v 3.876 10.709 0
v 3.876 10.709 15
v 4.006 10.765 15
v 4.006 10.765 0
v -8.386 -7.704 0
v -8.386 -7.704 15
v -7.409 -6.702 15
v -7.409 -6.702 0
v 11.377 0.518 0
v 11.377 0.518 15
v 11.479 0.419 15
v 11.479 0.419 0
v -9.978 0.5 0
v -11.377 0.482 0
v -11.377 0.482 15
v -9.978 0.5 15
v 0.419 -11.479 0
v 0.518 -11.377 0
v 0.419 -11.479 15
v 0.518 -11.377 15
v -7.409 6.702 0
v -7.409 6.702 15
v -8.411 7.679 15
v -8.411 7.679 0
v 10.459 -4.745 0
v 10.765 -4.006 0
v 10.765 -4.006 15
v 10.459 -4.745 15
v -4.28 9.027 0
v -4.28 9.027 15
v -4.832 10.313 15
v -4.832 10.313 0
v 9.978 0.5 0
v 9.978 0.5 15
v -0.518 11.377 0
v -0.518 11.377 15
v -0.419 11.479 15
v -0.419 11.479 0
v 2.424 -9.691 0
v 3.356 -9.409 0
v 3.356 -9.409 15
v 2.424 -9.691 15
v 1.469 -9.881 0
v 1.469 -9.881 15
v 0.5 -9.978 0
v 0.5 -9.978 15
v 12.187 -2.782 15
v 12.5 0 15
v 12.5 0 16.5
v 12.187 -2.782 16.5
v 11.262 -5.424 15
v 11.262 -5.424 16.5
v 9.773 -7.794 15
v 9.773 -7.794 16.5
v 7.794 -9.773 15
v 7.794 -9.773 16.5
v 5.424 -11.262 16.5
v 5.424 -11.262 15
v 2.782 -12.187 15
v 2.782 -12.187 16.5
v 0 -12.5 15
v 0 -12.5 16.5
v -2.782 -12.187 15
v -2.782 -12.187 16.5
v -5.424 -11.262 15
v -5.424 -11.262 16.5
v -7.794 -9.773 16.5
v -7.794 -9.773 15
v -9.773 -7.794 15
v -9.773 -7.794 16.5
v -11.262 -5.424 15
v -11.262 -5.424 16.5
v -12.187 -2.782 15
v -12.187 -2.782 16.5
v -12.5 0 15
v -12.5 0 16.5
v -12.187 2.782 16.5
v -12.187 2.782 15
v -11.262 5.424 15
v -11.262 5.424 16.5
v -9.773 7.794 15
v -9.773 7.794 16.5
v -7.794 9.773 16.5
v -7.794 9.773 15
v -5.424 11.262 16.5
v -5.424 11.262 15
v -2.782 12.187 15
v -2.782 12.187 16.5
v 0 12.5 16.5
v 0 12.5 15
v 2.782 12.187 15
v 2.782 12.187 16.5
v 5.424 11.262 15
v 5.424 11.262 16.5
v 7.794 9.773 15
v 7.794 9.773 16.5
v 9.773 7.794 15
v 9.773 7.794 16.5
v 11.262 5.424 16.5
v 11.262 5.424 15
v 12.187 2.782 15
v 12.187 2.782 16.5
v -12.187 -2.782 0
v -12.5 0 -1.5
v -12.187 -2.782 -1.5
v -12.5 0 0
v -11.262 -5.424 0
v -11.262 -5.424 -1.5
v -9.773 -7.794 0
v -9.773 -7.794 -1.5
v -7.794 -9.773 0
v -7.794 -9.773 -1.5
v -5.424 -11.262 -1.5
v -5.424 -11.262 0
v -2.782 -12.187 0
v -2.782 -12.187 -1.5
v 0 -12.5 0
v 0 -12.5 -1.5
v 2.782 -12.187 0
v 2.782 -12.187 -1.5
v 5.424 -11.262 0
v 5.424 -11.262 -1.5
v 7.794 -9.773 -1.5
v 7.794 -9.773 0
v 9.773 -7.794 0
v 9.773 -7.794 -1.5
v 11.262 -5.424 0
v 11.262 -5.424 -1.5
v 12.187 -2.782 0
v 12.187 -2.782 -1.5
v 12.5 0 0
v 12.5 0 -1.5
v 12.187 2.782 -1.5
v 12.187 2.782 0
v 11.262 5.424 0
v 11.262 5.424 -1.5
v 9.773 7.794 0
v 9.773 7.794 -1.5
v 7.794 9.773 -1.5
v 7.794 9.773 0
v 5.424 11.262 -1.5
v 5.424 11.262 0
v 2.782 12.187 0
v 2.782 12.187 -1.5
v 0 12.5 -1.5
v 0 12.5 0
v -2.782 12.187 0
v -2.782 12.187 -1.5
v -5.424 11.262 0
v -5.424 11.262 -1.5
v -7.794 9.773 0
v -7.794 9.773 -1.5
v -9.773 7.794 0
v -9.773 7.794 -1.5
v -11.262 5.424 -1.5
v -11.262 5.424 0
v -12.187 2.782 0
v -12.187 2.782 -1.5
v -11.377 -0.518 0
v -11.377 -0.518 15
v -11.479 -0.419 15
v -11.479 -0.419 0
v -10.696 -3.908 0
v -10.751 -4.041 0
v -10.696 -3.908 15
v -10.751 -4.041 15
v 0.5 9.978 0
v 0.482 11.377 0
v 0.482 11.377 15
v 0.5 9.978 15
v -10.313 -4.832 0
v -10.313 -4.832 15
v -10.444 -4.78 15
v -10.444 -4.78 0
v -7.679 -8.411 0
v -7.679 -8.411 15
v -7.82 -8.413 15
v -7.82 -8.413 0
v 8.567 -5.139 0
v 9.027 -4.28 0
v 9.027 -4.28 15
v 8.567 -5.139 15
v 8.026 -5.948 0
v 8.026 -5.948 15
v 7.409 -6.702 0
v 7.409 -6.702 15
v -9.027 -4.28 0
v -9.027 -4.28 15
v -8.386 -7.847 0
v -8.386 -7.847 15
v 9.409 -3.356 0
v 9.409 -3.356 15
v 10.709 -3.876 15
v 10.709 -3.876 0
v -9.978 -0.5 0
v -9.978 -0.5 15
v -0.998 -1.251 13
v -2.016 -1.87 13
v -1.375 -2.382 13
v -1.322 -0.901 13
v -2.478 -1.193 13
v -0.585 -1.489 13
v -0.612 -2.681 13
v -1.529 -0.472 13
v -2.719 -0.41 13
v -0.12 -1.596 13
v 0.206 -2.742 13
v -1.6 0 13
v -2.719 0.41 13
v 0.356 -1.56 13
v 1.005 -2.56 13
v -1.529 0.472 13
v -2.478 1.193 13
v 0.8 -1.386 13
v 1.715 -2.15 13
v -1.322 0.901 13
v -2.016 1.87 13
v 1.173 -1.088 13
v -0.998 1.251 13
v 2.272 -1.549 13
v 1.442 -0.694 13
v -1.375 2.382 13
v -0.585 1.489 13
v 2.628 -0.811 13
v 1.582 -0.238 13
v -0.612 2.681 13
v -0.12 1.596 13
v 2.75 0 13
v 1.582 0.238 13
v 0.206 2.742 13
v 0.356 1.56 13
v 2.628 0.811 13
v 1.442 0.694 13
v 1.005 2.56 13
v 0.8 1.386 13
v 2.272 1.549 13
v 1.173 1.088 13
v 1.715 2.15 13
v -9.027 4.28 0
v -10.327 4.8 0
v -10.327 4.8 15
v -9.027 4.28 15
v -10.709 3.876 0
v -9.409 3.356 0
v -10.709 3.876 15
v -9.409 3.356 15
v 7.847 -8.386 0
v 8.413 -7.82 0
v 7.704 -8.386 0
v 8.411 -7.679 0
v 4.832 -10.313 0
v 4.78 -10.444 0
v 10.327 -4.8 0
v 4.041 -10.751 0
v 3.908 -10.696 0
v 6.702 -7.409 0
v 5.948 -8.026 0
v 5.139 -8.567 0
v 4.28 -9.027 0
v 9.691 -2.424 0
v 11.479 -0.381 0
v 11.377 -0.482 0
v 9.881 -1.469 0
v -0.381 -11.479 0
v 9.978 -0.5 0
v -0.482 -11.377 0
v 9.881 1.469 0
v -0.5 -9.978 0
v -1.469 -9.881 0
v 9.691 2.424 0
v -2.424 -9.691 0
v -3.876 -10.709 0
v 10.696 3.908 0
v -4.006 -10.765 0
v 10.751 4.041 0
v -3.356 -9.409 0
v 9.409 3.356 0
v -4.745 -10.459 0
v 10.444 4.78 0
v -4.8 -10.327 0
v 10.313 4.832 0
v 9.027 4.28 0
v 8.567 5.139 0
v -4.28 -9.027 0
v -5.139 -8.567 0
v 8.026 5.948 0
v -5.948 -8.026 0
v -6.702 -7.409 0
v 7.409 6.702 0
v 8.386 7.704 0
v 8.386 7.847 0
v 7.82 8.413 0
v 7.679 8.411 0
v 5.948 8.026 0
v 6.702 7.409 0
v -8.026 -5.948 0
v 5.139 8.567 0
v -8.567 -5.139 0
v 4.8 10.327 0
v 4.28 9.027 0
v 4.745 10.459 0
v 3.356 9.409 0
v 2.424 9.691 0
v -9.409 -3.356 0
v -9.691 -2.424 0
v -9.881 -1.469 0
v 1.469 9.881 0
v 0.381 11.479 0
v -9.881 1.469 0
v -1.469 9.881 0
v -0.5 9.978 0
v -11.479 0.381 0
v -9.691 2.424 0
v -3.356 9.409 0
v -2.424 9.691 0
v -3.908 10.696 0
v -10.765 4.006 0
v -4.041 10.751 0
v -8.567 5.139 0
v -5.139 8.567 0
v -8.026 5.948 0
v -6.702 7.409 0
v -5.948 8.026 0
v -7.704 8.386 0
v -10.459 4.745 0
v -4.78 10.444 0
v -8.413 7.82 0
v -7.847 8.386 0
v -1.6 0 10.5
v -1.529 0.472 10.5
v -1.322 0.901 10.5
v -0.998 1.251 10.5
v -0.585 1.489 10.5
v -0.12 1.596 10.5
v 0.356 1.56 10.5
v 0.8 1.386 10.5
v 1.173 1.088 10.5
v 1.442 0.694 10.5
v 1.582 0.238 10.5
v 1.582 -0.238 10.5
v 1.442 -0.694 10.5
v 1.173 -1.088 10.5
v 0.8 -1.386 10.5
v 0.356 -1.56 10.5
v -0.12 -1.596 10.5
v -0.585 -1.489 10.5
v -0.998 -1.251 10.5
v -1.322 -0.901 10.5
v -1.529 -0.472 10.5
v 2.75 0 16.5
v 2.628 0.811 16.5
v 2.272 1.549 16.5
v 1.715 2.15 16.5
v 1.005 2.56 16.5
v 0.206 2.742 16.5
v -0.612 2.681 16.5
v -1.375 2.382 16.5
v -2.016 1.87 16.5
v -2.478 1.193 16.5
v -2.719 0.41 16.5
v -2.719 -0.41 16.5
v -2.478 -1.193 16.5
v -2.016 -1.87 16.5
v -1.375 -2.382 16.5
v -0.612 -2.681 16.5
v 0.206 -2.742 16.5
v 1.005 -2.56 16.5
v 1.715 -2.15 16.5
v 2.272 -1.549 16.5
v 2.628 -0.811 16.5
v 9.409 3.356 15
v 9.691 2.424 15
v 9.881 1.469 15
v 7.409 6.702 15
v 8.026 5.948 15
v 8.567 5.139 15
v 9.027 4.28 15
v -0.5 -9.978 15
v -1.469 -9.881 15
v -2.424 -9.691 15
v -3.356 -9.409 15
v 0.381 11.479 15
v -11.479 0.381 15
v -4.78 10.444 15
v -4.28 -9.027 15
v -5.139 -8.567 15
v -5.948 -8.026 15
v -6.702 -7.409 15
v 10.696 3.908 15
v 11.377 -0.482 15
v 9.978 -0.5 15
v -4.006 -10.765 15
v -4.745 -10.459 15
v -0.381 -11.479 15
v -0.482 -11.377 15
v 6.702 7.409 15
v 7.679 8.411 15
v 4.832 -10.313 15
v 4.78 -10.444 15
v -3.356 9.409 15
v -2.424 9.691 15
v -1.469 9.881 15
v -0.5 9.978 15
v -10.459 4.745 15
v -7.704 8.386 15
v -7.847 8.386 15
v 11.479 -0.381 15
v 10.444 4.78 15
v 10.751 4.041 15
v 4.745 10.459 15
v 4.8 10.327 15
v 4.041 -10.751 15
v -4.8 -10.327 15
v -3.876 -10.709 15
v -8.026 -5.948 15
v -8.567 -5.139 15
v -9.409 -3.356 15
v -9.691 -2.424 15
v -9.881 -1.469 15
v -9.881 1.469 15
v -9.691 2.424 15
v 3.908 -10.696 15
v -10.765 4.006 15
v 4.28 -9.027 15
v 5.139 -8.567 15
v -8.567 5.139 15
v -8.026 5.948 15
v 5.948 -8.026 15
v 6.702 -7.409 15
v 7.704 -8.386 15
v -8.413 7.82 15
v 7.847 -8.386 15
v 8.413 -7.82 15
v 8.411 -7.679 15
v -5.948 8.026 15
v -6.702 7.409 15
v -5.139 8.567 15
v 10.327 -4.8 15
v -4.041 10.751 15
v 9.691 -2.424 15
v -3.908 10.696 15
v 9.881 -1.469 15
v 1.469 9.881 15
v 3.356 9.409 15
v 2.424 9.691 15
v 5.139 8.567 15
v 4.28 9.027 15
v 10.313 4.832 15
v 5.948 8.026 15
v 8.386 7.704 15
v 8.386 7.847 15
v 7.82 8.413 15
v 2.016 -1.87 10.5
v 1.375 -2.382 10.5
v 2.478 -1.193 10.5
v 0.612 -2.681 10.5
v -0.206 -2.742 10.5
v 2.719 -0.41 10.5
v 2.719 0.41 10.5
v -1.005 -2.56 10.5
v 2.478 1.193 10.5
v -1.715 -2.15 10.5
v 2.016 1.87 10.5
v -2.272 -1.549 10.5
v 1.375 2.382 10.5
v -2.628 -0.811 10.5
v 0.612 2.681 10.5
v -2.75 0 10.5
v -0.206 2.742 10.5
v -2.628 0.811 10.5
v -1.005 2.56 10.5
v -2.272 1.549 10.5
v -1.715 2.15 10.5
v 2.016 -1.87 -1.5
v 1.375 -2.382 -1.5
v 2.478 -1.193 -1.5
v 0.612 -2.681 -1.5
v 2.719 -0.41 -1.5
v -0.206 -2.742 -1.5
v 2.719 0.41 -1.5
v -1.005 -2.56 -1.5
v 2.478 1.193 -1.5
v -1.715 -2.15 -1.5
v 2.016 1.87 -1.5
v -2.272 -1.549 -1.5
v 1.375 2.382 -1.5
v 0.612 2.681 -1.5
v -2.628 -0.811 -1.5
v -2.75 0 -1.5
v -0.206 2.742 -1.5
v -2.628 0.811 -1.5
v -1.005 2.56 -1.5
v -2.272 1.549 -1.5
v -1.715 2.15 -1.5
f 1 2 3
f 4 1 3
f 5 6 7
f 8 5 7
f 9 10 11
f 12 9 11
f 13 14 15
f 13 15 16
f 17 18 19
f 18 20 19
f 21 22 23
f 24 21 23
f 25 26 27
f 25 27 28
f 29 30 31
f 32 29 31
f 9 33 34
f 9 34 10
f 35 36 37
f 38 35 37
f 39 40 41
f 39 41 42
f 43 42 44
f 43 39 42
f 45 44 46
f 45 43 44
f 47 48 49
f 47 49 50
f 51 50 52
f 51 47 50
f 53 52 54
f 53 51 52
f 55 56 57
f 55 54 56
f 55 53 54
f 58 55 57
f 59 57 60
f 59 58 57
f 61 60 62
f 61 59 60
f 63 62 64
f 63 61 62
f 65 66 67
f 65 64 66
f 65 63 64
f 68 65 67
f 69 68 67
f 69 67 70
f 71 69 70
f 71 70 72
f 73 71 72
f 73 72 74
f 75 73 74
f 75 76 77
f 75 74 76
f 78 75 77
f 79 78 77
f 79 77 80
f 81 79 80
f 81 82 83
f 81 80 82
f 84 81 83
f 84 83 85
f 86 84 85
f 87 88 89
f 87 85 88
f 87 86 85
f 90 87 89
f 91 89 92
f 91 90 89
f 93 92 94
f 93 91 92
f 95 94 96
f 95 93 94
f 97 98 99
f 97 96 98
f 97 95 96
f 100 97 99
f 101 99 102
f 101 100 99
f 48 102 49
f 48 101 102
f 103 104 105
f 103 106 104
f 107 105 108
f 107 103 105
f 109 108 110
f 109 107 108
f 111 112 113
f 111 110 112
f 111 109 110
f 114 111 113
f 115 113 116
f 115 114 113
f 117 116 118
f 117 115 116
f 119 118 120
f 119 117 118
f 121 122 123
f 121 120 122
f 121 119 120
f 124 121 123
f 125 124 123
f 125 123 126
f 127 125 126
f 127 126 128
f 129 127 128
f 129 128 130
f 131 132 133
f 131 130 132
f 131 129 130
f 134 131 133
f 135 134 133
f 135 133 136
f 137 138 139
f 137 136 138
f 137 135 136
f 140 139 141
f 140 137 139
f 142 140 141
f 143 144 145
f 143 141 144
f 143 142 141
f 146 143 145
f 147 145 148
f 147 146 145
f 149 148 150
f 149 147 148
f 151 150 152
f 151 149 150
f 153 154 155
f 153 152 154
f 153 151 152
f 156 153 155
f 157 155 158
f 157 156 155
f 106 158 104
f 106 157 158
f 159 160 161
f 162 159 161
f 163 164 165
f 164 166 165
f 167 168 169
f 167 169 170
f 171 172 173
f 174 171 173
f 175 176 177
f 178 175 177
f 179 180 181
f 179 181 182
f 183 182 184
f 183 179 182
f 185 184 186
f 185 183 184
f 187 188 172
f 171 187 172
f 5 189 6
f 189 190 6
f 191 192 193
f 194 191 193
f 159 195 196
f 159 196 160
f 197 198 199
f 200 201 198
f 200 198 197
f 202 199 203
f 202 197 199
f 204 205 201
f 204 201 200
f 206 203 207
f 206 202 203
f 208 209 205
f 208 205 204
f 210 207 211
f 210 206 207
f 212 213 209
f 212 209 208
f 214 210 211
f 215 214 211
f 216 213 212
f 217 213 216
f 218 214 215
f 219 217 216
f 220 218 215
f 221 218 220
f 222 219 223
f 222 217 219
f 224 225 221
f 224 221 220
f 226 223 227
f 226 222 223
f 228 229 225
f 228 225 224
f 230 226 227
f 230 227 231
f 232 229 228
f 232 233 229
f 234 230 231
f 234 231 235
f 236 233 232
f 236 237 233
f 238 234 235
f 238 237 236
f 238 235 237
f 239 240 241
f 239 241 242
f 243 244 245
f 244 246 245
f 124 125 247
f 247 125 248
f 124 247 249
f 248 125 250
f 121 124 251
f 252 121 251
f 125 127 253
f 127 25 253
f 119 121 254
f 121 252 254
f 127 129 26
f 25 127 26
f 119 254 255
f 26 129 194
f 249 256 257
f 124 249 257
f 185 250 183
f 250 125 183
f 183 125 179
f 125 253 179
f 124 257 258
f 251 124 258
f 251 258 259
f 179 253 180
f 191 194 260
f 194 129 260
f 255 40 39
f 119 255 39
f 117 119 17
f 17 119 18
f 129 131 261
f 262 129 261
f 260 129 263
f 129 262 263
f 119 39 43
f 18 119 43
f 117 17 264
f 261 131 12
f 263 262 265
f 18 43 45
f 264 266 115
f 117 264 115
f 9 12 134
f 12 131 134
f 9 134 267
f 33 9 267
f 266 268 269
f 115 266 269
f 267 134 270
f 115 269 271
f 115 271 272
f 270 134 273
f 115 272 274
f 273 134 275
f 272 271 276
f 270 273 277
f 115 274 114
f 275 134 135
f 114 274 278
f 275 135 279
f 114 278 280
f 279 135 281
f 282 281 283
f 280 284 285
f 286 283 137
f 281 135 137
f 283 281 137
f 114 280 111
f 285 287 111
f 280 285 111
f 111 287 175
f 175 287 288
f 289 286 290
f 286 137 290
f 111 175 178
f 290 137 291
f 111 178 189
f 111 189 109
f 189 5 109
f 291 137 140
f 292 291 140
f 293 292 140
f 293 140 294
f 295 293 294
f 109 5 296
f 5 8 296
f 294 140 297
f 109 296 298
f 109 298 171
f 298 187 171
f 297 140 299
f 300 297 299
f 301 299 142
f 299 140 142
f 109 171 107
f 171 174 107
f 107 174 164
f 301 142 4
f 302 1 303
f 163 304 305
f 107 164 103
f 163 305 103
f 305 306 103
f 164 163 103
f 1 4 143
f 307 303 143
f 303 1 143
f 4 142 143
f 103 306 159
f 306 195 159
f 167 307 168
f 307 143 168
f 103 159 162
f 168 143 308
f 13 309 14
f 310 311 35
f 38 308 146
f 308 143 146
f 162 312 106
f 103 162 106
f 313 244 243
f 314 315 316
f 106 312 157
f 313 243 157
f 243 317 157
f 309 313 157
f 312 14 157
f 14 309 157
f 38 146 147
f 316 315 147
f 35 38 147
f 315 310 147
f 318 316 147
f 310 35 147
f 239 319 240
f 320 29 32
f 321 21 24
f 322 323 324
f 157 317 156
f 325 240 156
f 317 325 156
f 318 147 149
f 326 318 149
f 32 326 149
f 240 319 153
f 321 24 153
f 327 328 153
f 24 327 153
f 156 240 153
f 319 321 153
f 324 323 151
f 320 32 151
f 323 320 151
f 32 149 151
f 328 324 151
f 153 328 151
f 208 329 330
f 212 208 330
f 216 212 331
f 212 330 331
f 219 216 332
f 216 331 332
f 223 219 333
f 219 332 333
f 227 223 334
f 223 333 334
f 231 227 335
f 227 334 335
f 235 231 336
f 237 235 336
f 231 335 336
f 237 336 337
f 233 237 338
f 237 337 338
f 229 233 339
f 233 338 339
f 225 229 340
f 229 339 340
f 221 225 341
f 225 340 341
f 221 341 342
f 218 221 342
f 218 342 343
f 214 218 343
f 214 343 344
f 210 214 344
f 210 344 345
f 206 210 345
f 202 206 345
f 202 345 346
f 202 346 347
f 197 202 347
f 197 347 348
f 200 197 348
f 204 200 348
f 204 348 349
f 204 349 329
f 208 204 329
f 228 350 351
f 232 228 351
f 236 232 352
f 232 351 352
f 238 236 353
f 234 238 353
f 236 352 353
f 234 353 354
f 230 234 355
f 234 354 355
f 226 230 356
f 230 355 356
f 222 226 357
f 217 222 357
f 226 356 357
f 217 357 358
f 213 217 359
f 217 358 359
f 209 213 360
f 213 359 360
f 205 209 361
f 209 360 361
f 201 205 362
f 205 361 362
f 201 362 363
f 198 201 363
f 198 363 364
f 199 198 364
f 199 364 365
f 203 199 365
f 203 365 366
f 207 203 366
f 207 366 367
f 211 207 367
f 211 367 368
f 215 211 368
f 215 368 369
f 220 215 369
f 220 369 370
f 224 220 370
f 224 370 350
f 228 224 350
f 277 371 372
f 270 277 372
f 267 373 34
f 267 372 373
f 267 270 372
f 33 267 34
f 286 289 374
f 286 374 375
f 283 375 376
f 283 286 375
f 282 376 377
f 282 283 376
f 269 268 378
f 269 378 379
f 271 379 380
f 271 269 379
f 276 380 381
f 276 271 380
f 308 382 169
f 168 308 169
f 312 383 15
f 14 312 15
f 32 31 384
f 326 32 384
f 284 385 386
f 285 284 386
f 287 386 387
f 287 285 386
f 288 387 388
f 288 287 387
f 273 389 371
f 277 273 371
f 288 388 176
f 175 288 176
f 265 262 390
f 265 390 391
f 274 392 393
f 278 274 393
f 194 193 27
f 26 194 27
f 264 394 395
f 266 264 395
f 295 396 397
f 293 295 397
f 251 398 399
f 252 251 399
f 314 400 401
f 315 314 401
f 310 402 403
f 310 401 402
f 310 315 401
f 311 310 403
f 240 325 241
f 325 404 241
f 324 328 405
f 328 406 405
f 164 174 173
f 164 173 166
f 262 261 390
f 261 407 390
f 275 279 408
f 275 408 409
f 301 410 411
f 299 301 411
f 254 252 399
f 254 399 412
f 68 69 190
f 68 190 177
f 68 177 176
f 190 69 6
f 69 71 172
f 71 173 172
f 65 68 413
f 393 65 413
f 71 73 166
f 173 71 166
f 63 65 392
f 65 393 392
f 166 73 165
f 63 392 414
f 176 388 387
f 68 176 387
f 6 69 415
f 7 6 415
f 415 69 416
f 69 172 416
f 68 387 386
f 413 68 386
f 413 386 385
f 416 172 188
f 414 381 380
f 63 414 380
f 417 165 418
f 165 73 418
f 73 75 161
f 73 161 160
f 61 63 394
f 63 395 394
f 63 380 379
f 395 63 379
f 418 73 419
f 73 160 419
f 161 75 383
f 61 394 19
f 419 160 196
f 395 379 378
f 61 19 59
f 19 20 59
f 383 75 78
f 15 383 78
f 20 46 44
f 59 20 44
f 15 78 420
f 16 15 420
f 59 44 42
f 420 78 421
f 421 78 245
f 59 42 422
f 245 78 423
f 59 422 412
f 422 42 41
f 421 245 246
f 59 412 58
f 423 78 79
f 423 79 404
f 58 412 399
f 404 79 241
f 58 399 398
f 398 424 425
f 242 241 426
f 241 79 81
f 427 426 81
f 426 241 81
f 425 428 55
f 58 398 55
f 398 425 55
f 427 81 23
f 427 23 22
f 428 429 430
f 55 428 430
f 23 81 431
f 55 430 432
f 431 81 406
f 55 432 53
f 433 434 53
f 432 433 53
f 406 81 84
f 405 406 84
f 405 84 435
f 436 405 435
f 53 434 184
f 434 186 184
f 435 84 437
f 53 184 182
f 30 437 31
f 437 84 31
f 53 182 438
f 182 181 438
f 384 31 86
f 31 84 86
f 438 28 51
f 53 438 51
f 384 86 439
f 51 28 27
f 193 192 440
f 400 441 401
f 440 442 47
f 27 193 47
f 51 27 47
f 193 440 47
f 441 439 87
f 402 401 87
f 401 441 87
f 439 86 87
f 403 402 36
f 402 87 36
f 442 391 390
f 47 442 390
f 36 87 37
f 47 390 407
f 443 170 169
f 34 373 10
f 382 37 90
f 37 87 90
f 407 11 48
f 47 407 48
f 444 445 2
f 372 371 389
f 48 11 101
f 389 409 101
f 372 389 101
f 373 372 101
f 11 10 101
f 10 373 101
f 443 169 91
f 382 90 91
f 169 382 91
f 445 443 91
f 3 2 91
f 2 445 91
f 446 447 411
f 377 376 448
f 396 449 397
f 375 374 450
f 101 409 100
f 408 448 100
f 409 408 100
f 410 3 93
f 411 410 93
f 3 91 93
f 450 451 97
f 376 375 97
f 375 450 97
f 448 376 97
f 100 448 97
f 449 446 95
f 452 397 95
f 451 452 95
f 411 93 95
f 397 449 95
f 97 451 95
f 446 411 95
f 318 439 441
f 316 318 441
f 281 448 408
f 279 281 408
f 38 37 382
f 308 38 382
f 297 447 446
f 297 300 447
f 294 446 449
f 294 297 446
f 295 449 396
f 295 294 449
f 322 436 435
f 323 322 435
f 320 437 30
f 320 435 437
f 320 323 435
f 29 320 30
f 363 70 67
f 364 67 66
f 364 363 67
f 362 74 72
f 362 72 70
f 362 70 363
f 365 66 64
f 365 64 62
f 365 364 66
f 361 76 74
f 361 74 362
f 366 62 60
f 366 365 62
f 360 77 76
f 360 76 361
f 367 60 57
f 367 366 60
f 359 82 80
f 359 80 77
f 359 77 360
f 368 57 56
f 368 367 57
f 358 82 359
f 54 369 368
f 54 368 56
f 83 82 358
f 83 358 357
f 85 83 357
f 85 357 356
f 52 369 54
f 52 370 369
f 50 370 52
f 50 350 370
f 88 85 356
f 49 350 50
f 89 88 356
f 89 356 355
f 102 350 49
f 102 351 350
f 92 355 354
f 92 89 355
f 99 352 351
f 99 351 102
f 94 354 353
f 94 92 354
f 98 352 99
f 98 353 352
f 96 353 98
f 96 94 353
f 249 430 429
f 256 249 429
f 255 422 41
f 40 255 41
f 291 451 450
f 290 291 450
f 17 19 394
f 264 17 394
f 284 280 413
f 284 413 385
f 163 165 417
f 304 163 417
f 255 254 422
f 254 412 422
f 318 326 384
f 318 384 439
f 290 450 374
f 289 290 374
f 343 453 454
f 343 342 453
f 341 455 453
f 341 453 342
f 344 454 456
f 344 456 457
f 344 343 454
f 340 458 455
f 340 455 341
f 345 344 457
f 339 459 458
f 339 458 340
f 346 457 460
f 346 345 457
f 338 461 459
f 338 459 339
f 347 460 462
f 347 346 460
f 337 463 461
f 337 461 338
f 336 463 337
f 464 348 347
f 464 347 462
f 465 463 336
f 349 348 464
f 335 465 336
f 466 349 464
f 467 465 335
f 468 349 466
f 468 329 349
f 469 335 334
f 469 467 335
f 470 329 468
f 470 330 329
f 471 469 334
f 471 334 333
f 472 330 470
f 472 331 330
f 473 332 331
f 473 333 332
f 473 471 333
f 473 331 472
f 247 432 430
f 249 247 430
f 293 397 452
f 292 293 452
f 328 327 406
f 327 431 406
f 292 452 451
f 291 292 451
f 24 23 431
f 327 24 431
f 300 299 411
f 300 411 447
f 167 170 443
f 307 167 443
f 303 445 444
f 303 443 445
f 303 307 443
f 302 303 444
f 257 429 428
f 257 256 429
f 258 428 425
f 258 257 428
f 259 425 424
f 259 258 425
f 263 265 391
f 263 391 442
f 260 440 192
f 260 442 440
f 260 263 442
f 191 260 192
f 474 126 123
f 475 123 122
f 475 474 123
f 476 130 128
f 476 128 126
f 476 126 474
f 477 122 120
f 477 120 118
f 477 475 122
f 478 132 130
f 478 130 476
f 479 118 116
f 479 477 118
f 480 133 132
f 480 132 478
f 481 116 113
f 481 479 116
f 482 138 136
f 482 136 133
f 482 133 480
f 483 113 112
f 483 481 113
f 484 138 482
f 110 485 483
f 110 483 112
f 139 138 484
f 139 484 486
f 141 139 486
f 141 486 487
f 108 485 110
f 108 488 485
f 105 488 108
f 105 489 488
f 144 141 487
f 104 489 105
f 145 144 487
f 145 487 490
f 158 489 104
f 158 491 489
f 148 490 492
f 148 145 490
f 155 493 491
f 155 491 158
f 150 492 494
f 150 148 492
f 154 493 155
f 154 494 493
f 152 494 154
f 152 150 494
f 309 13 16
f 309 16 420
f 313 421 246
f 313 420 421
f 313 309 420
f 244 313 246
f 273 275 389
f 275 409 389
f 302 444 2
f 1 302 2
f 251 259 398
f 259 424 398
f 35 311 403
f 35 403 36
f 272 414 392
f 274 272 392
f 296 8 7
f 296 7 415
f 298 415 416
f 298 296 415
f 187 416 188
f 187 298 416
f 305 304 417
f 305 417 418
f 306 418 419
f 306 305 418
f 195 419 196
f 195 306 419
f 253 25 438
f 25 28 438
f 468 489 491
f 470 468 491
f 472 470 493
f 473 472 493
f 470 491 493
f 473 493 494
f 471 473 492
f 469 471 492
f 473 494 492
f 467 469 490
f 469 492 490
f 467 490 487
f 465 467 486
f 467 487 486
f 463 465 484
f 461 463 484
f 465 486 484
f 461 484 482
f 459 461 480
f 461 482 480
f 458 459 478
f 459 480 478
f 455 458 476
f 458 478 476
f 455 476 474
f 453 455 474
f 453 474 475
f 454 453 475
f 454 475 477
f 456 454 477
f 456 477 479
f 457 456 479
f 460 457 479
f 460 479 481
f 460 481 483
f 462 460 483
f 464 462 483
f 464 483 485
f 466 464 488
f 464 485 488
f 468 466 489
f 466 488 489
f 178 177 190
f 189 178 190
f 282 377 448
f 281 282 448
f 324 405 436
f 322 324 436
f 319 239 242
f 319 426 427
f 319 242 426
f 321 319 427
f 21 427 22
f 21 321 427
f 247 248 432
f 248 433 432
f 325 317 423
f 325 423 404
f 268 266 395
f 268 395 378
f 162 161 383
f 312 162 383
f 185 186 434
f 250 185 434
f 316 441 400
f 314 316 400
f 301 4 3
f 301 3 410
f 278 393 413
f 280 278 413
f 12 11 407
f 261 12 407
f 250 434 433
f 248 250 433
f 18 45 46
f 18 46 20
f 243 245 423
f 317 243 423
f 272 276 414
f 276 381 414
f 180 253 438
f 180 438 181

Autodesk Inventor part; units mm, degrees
ref_plane "YZ Plane" through (0, 0, 0) normal (1, 0, 0) x (0, 1, 0)
ref_plane "XZ Plane" through (0, 0, 0) normal (0, 1, 0) x (-1, 0, 0)
ref_plane "XY Plane" through (0, 0, 0) normal (0, 0, 1) x (1, 0, 0)
sketch "Skizze1" plane through (0, 0, 0) normal (0, 0, 1) x (1, 0, 0)
  circle A0 centre (0, 0) radius 9.99
  dimension "d0" = 19.98
extrude "Extrusion1" add sketch "Skizze1" along normal blind 15
sketch "Skizze2" plane through (0, 0, 15) normal (0, 0, 1) x (1, 0, 0)
  circle A0 centre (0, 0) radius 9.99 projected
  line L0 (-0.5, 9.9775) -> (0.5, 9.9775)
  line L1 (-0.5, 9.9775) -> (-0.5177, 11.3774)
  line L2 (0.4823, 11.3774) -> (0.5, 9.9775)
  line L3 (-0.5177, 11.3774) -> (-0.419, 11.4786)
  line L4 (0.381, 11.4786) -> (0.4823, 11.3774)
  line L5 (-0.419, 11.4786) -> (0.381, 11.4786)
  line L6 (-4.2802, 9.0266) -> (-4.8322, 10.3132)
  line L7 (-4.8322, 10.3132) -> (-4.7798, 10.4445)
  line L8 (-4.7798, 10.4445) -> (-4.0407, 10.7507)
  line L9 (-4.0407, 10.7507) -> (-3.9084, 10.6959)
  line L10 (-3.9084, 10.6959) -> (-3.3563, 9.4093)
  line L11 (-4.2802, 9.0266) -> (-3.3563, 9.4093)
  line L12 (-7.4087, 6.7016) -> (-8.4111, 7.6789)
  line L13 (-8.4111, 7.6789) -> (-8.4129, 7.8203)
  line L14 (-8.4129, 7.8203) -> (-7.8472, 8.386)
  line L15 (-7.8472, 8.386) -> (-7.704, 8.386)
  line L16 (-7.704, 8.386) -> (-6.7016, 7.4087)
  line L17 (-7.4087, 6.7016) -> (-6.7016, 7.4087)
  line L18 (-9.4093, 3.3563) -> (-10.7094, 3.8756)
  line L19 (-10.7094, 3.8756) -> (-10.7652, 4.0056)
  line L20 (-10.7652, 4.0056) -> (-10.4591, 4.7447)
  line L21 (-10.4591, 4.7447) -> (-10.3268, 4.7995)
  line L22 (-10.3268, 4.7995) -> (-9.0266, 4.2802)
  line L23 (-9.4093, 3.3563) -> (-9.0266, 4.2802)
  line L24 (-9.9775, -0.5) -> (-11.3774, -0.5177)
  line L25 (-11.3774, -0.5177) -> (-11.4786, -0.419)
  line L26 (-11.4786, -0.419) -> (-11.4786, 0.381)
  line L27 (-11.4786, 0.381) -> (-11.3774, 0.4823)
  line L28 (-11.3774, 0.4823) -> (-9.9775, 0.5)
  line L29 (-9.9775, -0.5) -> (-9.9775, 0.5)
  line L30 (-9.0266, -4.2802) -> (-10.3132, -4.8322)
  line L31 (-10.3132, -4.8322) -> (-10.4445, -4.7798)
  line L32 (-10.4445, -4.7798) -> (-10.7507, -4.0407)
  line L33 (-10.7507, -4.0407) -> (-10.6959, -3.9084)
  line L34 (-10.6959, -3.9084) -> (-9.4093, -3.3563)
  line L35 (-9.0266, -4.2802) -> (-9.4093, -3.3563)
  line L36 (-6.7016, -7.4087) -> (-7.6789, -8.4111)
  line L37 (-7.6789, -8.4111) -> (-7.8203, -8.4129)
  line L38 (-7.8203, -8.4129) -> (-8.386, -7.8472)
  line L39 (-8.386, -7.8472) -> (-8.386, -7.704)
  line L40 (-8.386, -7.704) -> (-7.4087, -6.7016)
  line L41 (-6.7016, -7.4087) -> (-7.4087, -6.7016)
  line L42 (-3.3563, -9.4093) -> (-3.8756, -10.7094)
  line L43 (-3.8756, -10.7094) -> (-4.0056, -10.7652)
  line L44 (-4.0056, -10.7652) -> (-4.7447, -10.4591)
  line L45 (-4.7447, -10.4591) -> (-4.7995, -10.3268)
  line L46 (-4.7995, -10.3268) -> (-4.2802, -9.0266)
  line L47 (-3.3563, -9.4093) -> (-4.2802, -9.0266)
  line L48 (0.5, -9.9775) -> (0.5177, -11.3774)
  line L49 (0.5177, -11.3774) -> (0.419, -11.4786)
  line L50 (0.419, -11.4786) -> (-0.381, -11.4786)
  line L51 (-0.381, -11.4786) -> (-0.4823, -11.3774)
  line L52 (-0.4823, -11.3774) -> (-0.5, -9.9775)
  line L53 (0.5, -9.9775) -> (-0.5, -9.9775)
  line L54 (4.2802, -9.0266) -> (4.8322, -10.3132)
  line L55 (4.8322, -10.3132) -> (4.7798, -10.4445)
  line L56 (4.7798, -10.4445) -> (4.0407, -10.7507)
  line L57 (4.0407, -10.7507) -> (3.9084, -10.6959)
  line L58 (3.9084, -10.6959) -> (3.3563, -9.4093)
  line L59 (4.2802, -9.0266) -> (3.3563, -9.4093)
  line L60 (7.4087, -6.7016) -> (8.4111, -7.6789)
  line L61 (8.4111, -7.6789) -> (8.4129, -7.8203)
  line L62 (8.4129, -7.8203) -> (7.8472, -8.386)
  line L63 (7.8472, -8.386) -> (7.704, -8.386)
  line L64 (7.704, -8.386) -> (6.7016, -7.4087)
  line L65 (7.4087, -6.7016) -> (6.7016, -7.4087)
  line L66 (9.4093, -3.3563) -> (10.7094, -3.8756)
  line L67 (10.7094, -3.8756) -> (10.7652, -4.0056)
  line L68 (10.7652, -4.0056) -> (10.4591, -4.7447)
  line L69 (10.4591, -4.7447) -> (10.3268, -4.7995)
  line L70 (10.3268, -4.7995) -> (9.0266, -4.2802)
  line L71 (9.4093, -3.3563) -> (9.0266, -4.2802)
  line L72 (9.9775, 0.5) -> (11.3774, 0.5177)
  line L73 (11.3774, 0.5177) -> (11.4786, 0.419)
  line L74 (11.4786, 0.419) -> (11.4786, -0.381)
  line L75 (11.4786, -0.381) -> (11.3774, -0.4823)
  line L76 (11.3774, -0.4823) -> (9.9775, -0.5)
  line L77 (9.9775, 0.5) -> (9.9775, -0.5)
  line L78 (9.0266, 4.2802) -> (10.3132, 4.8322)
  line L79 (10.3132, 4.8322) -> (10.4445, 4.7798)
  line L80 (10.4445, 4.7798) -> (10.7507, 4.0407)
  line L81 (10.7507, 4.0407) -> (10.6959, 3.9084)
  line L82 (10.6959, 3.9084) -> (9.4093, 3.3563)
  line L83 (9.0266, 4.2802) -> (9.4093, 3.3563)
  line L84 (6.7016, 7.4087) -> (7.6789, 8.4111)
  line L85 (7.6789, 8.4111) -> (7.8203, 8.4129)
  line L86 (7.8203, 8.4129) -> (8.386, 7.8472)
  line L87 (8.386, 7.8472) -> (8.386, 7.704)
  line L88 (8.386, 7.704) -> (7.4087, 6.7016)
  line L89 (6.7016, 7.4087) -> (7.4087, 6.7016)
  line L90 (3.3563, 9.4093) -> (3.8756, 10.7094)
  line L91 (3.8756, 10.7094) -> (4.0056, 10.7652)
  line L92 (4.0056, 10.7652) -> (4.7447, 10.4591)
  line L93 (4.7447, 10.4591) -> (4.7995, 10.3268)
  line L94 (4.7995, 10.3268) -> (4.2802, 9.0266)
  line L95 (3.3563, 9.4093) -> (4.2802, 9.0266)
  dimension "d4" = 1
  dimension "d31" = 0.1
  dimension "d52" = 360
extrude "Extrusion2" add sketch "Skizze2" against normal blind 15 contours A0 L72 L73 L74 L75 L76 | A0 L78 L79 L80 L81 L82 | L66 L67 L68 L69 L70 A0 | A0 L71 | A0 L84 L85 L86 L87 L88 | L60 L61 L62 L63 L64 A0 | A0 L65 | A0 L90 L91 L92 L93 L94 | L54 L55 L56 L57 L58 A0 | A0 L59 | L0 A0 | A0 L1 L3 L5 L4 L2 | L48 L49 L50 L51 L52 A0 | A0 L53 | A0 L6 L7 L8 L9 L10 | L42 L43 L44 L45 L46 A0 | A0 L12 L13 L14 L15 L16 | L36 L37 L38 L39 L40 A0 | L23 A0 | A0 L18 L19 L20 L21 L22 | L30 L31 L32 L33 L34 A0 | A0 L35 | L29 A0 | A0 L24 L25 L26 L27 L28
sketch "Skizze3" plane through (0, 0, 15) normal (0, 0, 1) x (1, 0, 0)
  circle A0 centre (0, 0) radius 12.5
  dimension "d15" = 25
extrude "Extrusion3" add sketch "Skizze3" along normal blind 1.5
sketch "Skizze4" plane through (0, 0, 0) normal (0, 0, -1) x (-1, 0, 0)
  circle A0 centre (0, 0) radius 12.5
  dimension "d33" = 25
extrude "Extrusion4" add sketch "Skizze4" along normal blind 1.5
sketch "Skizze5" plane through (0, 0, 16.5) normal (0, 0, 1) x (1, 0, 0)
  circle A0 centre (0, 0) radius 2.75
  dimension "d20" = 5.5
extrude "Extrusion5" cut sketch "Skizze5" against normal blind 3.5
sketch "Skizze6" plane through (0, 0, -1.5) normal (0, 0, -1) x (-1, 0, 0)
  circle A0 centre (0, 0) radius 2.75
  dimension "d23" = 5.5
extrude "Extrusion6" cut sketch "Skizze6" against normal blind 12
sketch "Skizze7" plane through (0, 0, 10.5) normal (0, 0, -1) x (-1, 0, 0)
  circle A0 centre (0, 0) radius 1.6
  dimension "d26" = 3.2
extrude "Extrusion7" cut sketch "Skizze7" against normal blind 12
properties part number "zahnrad2"
